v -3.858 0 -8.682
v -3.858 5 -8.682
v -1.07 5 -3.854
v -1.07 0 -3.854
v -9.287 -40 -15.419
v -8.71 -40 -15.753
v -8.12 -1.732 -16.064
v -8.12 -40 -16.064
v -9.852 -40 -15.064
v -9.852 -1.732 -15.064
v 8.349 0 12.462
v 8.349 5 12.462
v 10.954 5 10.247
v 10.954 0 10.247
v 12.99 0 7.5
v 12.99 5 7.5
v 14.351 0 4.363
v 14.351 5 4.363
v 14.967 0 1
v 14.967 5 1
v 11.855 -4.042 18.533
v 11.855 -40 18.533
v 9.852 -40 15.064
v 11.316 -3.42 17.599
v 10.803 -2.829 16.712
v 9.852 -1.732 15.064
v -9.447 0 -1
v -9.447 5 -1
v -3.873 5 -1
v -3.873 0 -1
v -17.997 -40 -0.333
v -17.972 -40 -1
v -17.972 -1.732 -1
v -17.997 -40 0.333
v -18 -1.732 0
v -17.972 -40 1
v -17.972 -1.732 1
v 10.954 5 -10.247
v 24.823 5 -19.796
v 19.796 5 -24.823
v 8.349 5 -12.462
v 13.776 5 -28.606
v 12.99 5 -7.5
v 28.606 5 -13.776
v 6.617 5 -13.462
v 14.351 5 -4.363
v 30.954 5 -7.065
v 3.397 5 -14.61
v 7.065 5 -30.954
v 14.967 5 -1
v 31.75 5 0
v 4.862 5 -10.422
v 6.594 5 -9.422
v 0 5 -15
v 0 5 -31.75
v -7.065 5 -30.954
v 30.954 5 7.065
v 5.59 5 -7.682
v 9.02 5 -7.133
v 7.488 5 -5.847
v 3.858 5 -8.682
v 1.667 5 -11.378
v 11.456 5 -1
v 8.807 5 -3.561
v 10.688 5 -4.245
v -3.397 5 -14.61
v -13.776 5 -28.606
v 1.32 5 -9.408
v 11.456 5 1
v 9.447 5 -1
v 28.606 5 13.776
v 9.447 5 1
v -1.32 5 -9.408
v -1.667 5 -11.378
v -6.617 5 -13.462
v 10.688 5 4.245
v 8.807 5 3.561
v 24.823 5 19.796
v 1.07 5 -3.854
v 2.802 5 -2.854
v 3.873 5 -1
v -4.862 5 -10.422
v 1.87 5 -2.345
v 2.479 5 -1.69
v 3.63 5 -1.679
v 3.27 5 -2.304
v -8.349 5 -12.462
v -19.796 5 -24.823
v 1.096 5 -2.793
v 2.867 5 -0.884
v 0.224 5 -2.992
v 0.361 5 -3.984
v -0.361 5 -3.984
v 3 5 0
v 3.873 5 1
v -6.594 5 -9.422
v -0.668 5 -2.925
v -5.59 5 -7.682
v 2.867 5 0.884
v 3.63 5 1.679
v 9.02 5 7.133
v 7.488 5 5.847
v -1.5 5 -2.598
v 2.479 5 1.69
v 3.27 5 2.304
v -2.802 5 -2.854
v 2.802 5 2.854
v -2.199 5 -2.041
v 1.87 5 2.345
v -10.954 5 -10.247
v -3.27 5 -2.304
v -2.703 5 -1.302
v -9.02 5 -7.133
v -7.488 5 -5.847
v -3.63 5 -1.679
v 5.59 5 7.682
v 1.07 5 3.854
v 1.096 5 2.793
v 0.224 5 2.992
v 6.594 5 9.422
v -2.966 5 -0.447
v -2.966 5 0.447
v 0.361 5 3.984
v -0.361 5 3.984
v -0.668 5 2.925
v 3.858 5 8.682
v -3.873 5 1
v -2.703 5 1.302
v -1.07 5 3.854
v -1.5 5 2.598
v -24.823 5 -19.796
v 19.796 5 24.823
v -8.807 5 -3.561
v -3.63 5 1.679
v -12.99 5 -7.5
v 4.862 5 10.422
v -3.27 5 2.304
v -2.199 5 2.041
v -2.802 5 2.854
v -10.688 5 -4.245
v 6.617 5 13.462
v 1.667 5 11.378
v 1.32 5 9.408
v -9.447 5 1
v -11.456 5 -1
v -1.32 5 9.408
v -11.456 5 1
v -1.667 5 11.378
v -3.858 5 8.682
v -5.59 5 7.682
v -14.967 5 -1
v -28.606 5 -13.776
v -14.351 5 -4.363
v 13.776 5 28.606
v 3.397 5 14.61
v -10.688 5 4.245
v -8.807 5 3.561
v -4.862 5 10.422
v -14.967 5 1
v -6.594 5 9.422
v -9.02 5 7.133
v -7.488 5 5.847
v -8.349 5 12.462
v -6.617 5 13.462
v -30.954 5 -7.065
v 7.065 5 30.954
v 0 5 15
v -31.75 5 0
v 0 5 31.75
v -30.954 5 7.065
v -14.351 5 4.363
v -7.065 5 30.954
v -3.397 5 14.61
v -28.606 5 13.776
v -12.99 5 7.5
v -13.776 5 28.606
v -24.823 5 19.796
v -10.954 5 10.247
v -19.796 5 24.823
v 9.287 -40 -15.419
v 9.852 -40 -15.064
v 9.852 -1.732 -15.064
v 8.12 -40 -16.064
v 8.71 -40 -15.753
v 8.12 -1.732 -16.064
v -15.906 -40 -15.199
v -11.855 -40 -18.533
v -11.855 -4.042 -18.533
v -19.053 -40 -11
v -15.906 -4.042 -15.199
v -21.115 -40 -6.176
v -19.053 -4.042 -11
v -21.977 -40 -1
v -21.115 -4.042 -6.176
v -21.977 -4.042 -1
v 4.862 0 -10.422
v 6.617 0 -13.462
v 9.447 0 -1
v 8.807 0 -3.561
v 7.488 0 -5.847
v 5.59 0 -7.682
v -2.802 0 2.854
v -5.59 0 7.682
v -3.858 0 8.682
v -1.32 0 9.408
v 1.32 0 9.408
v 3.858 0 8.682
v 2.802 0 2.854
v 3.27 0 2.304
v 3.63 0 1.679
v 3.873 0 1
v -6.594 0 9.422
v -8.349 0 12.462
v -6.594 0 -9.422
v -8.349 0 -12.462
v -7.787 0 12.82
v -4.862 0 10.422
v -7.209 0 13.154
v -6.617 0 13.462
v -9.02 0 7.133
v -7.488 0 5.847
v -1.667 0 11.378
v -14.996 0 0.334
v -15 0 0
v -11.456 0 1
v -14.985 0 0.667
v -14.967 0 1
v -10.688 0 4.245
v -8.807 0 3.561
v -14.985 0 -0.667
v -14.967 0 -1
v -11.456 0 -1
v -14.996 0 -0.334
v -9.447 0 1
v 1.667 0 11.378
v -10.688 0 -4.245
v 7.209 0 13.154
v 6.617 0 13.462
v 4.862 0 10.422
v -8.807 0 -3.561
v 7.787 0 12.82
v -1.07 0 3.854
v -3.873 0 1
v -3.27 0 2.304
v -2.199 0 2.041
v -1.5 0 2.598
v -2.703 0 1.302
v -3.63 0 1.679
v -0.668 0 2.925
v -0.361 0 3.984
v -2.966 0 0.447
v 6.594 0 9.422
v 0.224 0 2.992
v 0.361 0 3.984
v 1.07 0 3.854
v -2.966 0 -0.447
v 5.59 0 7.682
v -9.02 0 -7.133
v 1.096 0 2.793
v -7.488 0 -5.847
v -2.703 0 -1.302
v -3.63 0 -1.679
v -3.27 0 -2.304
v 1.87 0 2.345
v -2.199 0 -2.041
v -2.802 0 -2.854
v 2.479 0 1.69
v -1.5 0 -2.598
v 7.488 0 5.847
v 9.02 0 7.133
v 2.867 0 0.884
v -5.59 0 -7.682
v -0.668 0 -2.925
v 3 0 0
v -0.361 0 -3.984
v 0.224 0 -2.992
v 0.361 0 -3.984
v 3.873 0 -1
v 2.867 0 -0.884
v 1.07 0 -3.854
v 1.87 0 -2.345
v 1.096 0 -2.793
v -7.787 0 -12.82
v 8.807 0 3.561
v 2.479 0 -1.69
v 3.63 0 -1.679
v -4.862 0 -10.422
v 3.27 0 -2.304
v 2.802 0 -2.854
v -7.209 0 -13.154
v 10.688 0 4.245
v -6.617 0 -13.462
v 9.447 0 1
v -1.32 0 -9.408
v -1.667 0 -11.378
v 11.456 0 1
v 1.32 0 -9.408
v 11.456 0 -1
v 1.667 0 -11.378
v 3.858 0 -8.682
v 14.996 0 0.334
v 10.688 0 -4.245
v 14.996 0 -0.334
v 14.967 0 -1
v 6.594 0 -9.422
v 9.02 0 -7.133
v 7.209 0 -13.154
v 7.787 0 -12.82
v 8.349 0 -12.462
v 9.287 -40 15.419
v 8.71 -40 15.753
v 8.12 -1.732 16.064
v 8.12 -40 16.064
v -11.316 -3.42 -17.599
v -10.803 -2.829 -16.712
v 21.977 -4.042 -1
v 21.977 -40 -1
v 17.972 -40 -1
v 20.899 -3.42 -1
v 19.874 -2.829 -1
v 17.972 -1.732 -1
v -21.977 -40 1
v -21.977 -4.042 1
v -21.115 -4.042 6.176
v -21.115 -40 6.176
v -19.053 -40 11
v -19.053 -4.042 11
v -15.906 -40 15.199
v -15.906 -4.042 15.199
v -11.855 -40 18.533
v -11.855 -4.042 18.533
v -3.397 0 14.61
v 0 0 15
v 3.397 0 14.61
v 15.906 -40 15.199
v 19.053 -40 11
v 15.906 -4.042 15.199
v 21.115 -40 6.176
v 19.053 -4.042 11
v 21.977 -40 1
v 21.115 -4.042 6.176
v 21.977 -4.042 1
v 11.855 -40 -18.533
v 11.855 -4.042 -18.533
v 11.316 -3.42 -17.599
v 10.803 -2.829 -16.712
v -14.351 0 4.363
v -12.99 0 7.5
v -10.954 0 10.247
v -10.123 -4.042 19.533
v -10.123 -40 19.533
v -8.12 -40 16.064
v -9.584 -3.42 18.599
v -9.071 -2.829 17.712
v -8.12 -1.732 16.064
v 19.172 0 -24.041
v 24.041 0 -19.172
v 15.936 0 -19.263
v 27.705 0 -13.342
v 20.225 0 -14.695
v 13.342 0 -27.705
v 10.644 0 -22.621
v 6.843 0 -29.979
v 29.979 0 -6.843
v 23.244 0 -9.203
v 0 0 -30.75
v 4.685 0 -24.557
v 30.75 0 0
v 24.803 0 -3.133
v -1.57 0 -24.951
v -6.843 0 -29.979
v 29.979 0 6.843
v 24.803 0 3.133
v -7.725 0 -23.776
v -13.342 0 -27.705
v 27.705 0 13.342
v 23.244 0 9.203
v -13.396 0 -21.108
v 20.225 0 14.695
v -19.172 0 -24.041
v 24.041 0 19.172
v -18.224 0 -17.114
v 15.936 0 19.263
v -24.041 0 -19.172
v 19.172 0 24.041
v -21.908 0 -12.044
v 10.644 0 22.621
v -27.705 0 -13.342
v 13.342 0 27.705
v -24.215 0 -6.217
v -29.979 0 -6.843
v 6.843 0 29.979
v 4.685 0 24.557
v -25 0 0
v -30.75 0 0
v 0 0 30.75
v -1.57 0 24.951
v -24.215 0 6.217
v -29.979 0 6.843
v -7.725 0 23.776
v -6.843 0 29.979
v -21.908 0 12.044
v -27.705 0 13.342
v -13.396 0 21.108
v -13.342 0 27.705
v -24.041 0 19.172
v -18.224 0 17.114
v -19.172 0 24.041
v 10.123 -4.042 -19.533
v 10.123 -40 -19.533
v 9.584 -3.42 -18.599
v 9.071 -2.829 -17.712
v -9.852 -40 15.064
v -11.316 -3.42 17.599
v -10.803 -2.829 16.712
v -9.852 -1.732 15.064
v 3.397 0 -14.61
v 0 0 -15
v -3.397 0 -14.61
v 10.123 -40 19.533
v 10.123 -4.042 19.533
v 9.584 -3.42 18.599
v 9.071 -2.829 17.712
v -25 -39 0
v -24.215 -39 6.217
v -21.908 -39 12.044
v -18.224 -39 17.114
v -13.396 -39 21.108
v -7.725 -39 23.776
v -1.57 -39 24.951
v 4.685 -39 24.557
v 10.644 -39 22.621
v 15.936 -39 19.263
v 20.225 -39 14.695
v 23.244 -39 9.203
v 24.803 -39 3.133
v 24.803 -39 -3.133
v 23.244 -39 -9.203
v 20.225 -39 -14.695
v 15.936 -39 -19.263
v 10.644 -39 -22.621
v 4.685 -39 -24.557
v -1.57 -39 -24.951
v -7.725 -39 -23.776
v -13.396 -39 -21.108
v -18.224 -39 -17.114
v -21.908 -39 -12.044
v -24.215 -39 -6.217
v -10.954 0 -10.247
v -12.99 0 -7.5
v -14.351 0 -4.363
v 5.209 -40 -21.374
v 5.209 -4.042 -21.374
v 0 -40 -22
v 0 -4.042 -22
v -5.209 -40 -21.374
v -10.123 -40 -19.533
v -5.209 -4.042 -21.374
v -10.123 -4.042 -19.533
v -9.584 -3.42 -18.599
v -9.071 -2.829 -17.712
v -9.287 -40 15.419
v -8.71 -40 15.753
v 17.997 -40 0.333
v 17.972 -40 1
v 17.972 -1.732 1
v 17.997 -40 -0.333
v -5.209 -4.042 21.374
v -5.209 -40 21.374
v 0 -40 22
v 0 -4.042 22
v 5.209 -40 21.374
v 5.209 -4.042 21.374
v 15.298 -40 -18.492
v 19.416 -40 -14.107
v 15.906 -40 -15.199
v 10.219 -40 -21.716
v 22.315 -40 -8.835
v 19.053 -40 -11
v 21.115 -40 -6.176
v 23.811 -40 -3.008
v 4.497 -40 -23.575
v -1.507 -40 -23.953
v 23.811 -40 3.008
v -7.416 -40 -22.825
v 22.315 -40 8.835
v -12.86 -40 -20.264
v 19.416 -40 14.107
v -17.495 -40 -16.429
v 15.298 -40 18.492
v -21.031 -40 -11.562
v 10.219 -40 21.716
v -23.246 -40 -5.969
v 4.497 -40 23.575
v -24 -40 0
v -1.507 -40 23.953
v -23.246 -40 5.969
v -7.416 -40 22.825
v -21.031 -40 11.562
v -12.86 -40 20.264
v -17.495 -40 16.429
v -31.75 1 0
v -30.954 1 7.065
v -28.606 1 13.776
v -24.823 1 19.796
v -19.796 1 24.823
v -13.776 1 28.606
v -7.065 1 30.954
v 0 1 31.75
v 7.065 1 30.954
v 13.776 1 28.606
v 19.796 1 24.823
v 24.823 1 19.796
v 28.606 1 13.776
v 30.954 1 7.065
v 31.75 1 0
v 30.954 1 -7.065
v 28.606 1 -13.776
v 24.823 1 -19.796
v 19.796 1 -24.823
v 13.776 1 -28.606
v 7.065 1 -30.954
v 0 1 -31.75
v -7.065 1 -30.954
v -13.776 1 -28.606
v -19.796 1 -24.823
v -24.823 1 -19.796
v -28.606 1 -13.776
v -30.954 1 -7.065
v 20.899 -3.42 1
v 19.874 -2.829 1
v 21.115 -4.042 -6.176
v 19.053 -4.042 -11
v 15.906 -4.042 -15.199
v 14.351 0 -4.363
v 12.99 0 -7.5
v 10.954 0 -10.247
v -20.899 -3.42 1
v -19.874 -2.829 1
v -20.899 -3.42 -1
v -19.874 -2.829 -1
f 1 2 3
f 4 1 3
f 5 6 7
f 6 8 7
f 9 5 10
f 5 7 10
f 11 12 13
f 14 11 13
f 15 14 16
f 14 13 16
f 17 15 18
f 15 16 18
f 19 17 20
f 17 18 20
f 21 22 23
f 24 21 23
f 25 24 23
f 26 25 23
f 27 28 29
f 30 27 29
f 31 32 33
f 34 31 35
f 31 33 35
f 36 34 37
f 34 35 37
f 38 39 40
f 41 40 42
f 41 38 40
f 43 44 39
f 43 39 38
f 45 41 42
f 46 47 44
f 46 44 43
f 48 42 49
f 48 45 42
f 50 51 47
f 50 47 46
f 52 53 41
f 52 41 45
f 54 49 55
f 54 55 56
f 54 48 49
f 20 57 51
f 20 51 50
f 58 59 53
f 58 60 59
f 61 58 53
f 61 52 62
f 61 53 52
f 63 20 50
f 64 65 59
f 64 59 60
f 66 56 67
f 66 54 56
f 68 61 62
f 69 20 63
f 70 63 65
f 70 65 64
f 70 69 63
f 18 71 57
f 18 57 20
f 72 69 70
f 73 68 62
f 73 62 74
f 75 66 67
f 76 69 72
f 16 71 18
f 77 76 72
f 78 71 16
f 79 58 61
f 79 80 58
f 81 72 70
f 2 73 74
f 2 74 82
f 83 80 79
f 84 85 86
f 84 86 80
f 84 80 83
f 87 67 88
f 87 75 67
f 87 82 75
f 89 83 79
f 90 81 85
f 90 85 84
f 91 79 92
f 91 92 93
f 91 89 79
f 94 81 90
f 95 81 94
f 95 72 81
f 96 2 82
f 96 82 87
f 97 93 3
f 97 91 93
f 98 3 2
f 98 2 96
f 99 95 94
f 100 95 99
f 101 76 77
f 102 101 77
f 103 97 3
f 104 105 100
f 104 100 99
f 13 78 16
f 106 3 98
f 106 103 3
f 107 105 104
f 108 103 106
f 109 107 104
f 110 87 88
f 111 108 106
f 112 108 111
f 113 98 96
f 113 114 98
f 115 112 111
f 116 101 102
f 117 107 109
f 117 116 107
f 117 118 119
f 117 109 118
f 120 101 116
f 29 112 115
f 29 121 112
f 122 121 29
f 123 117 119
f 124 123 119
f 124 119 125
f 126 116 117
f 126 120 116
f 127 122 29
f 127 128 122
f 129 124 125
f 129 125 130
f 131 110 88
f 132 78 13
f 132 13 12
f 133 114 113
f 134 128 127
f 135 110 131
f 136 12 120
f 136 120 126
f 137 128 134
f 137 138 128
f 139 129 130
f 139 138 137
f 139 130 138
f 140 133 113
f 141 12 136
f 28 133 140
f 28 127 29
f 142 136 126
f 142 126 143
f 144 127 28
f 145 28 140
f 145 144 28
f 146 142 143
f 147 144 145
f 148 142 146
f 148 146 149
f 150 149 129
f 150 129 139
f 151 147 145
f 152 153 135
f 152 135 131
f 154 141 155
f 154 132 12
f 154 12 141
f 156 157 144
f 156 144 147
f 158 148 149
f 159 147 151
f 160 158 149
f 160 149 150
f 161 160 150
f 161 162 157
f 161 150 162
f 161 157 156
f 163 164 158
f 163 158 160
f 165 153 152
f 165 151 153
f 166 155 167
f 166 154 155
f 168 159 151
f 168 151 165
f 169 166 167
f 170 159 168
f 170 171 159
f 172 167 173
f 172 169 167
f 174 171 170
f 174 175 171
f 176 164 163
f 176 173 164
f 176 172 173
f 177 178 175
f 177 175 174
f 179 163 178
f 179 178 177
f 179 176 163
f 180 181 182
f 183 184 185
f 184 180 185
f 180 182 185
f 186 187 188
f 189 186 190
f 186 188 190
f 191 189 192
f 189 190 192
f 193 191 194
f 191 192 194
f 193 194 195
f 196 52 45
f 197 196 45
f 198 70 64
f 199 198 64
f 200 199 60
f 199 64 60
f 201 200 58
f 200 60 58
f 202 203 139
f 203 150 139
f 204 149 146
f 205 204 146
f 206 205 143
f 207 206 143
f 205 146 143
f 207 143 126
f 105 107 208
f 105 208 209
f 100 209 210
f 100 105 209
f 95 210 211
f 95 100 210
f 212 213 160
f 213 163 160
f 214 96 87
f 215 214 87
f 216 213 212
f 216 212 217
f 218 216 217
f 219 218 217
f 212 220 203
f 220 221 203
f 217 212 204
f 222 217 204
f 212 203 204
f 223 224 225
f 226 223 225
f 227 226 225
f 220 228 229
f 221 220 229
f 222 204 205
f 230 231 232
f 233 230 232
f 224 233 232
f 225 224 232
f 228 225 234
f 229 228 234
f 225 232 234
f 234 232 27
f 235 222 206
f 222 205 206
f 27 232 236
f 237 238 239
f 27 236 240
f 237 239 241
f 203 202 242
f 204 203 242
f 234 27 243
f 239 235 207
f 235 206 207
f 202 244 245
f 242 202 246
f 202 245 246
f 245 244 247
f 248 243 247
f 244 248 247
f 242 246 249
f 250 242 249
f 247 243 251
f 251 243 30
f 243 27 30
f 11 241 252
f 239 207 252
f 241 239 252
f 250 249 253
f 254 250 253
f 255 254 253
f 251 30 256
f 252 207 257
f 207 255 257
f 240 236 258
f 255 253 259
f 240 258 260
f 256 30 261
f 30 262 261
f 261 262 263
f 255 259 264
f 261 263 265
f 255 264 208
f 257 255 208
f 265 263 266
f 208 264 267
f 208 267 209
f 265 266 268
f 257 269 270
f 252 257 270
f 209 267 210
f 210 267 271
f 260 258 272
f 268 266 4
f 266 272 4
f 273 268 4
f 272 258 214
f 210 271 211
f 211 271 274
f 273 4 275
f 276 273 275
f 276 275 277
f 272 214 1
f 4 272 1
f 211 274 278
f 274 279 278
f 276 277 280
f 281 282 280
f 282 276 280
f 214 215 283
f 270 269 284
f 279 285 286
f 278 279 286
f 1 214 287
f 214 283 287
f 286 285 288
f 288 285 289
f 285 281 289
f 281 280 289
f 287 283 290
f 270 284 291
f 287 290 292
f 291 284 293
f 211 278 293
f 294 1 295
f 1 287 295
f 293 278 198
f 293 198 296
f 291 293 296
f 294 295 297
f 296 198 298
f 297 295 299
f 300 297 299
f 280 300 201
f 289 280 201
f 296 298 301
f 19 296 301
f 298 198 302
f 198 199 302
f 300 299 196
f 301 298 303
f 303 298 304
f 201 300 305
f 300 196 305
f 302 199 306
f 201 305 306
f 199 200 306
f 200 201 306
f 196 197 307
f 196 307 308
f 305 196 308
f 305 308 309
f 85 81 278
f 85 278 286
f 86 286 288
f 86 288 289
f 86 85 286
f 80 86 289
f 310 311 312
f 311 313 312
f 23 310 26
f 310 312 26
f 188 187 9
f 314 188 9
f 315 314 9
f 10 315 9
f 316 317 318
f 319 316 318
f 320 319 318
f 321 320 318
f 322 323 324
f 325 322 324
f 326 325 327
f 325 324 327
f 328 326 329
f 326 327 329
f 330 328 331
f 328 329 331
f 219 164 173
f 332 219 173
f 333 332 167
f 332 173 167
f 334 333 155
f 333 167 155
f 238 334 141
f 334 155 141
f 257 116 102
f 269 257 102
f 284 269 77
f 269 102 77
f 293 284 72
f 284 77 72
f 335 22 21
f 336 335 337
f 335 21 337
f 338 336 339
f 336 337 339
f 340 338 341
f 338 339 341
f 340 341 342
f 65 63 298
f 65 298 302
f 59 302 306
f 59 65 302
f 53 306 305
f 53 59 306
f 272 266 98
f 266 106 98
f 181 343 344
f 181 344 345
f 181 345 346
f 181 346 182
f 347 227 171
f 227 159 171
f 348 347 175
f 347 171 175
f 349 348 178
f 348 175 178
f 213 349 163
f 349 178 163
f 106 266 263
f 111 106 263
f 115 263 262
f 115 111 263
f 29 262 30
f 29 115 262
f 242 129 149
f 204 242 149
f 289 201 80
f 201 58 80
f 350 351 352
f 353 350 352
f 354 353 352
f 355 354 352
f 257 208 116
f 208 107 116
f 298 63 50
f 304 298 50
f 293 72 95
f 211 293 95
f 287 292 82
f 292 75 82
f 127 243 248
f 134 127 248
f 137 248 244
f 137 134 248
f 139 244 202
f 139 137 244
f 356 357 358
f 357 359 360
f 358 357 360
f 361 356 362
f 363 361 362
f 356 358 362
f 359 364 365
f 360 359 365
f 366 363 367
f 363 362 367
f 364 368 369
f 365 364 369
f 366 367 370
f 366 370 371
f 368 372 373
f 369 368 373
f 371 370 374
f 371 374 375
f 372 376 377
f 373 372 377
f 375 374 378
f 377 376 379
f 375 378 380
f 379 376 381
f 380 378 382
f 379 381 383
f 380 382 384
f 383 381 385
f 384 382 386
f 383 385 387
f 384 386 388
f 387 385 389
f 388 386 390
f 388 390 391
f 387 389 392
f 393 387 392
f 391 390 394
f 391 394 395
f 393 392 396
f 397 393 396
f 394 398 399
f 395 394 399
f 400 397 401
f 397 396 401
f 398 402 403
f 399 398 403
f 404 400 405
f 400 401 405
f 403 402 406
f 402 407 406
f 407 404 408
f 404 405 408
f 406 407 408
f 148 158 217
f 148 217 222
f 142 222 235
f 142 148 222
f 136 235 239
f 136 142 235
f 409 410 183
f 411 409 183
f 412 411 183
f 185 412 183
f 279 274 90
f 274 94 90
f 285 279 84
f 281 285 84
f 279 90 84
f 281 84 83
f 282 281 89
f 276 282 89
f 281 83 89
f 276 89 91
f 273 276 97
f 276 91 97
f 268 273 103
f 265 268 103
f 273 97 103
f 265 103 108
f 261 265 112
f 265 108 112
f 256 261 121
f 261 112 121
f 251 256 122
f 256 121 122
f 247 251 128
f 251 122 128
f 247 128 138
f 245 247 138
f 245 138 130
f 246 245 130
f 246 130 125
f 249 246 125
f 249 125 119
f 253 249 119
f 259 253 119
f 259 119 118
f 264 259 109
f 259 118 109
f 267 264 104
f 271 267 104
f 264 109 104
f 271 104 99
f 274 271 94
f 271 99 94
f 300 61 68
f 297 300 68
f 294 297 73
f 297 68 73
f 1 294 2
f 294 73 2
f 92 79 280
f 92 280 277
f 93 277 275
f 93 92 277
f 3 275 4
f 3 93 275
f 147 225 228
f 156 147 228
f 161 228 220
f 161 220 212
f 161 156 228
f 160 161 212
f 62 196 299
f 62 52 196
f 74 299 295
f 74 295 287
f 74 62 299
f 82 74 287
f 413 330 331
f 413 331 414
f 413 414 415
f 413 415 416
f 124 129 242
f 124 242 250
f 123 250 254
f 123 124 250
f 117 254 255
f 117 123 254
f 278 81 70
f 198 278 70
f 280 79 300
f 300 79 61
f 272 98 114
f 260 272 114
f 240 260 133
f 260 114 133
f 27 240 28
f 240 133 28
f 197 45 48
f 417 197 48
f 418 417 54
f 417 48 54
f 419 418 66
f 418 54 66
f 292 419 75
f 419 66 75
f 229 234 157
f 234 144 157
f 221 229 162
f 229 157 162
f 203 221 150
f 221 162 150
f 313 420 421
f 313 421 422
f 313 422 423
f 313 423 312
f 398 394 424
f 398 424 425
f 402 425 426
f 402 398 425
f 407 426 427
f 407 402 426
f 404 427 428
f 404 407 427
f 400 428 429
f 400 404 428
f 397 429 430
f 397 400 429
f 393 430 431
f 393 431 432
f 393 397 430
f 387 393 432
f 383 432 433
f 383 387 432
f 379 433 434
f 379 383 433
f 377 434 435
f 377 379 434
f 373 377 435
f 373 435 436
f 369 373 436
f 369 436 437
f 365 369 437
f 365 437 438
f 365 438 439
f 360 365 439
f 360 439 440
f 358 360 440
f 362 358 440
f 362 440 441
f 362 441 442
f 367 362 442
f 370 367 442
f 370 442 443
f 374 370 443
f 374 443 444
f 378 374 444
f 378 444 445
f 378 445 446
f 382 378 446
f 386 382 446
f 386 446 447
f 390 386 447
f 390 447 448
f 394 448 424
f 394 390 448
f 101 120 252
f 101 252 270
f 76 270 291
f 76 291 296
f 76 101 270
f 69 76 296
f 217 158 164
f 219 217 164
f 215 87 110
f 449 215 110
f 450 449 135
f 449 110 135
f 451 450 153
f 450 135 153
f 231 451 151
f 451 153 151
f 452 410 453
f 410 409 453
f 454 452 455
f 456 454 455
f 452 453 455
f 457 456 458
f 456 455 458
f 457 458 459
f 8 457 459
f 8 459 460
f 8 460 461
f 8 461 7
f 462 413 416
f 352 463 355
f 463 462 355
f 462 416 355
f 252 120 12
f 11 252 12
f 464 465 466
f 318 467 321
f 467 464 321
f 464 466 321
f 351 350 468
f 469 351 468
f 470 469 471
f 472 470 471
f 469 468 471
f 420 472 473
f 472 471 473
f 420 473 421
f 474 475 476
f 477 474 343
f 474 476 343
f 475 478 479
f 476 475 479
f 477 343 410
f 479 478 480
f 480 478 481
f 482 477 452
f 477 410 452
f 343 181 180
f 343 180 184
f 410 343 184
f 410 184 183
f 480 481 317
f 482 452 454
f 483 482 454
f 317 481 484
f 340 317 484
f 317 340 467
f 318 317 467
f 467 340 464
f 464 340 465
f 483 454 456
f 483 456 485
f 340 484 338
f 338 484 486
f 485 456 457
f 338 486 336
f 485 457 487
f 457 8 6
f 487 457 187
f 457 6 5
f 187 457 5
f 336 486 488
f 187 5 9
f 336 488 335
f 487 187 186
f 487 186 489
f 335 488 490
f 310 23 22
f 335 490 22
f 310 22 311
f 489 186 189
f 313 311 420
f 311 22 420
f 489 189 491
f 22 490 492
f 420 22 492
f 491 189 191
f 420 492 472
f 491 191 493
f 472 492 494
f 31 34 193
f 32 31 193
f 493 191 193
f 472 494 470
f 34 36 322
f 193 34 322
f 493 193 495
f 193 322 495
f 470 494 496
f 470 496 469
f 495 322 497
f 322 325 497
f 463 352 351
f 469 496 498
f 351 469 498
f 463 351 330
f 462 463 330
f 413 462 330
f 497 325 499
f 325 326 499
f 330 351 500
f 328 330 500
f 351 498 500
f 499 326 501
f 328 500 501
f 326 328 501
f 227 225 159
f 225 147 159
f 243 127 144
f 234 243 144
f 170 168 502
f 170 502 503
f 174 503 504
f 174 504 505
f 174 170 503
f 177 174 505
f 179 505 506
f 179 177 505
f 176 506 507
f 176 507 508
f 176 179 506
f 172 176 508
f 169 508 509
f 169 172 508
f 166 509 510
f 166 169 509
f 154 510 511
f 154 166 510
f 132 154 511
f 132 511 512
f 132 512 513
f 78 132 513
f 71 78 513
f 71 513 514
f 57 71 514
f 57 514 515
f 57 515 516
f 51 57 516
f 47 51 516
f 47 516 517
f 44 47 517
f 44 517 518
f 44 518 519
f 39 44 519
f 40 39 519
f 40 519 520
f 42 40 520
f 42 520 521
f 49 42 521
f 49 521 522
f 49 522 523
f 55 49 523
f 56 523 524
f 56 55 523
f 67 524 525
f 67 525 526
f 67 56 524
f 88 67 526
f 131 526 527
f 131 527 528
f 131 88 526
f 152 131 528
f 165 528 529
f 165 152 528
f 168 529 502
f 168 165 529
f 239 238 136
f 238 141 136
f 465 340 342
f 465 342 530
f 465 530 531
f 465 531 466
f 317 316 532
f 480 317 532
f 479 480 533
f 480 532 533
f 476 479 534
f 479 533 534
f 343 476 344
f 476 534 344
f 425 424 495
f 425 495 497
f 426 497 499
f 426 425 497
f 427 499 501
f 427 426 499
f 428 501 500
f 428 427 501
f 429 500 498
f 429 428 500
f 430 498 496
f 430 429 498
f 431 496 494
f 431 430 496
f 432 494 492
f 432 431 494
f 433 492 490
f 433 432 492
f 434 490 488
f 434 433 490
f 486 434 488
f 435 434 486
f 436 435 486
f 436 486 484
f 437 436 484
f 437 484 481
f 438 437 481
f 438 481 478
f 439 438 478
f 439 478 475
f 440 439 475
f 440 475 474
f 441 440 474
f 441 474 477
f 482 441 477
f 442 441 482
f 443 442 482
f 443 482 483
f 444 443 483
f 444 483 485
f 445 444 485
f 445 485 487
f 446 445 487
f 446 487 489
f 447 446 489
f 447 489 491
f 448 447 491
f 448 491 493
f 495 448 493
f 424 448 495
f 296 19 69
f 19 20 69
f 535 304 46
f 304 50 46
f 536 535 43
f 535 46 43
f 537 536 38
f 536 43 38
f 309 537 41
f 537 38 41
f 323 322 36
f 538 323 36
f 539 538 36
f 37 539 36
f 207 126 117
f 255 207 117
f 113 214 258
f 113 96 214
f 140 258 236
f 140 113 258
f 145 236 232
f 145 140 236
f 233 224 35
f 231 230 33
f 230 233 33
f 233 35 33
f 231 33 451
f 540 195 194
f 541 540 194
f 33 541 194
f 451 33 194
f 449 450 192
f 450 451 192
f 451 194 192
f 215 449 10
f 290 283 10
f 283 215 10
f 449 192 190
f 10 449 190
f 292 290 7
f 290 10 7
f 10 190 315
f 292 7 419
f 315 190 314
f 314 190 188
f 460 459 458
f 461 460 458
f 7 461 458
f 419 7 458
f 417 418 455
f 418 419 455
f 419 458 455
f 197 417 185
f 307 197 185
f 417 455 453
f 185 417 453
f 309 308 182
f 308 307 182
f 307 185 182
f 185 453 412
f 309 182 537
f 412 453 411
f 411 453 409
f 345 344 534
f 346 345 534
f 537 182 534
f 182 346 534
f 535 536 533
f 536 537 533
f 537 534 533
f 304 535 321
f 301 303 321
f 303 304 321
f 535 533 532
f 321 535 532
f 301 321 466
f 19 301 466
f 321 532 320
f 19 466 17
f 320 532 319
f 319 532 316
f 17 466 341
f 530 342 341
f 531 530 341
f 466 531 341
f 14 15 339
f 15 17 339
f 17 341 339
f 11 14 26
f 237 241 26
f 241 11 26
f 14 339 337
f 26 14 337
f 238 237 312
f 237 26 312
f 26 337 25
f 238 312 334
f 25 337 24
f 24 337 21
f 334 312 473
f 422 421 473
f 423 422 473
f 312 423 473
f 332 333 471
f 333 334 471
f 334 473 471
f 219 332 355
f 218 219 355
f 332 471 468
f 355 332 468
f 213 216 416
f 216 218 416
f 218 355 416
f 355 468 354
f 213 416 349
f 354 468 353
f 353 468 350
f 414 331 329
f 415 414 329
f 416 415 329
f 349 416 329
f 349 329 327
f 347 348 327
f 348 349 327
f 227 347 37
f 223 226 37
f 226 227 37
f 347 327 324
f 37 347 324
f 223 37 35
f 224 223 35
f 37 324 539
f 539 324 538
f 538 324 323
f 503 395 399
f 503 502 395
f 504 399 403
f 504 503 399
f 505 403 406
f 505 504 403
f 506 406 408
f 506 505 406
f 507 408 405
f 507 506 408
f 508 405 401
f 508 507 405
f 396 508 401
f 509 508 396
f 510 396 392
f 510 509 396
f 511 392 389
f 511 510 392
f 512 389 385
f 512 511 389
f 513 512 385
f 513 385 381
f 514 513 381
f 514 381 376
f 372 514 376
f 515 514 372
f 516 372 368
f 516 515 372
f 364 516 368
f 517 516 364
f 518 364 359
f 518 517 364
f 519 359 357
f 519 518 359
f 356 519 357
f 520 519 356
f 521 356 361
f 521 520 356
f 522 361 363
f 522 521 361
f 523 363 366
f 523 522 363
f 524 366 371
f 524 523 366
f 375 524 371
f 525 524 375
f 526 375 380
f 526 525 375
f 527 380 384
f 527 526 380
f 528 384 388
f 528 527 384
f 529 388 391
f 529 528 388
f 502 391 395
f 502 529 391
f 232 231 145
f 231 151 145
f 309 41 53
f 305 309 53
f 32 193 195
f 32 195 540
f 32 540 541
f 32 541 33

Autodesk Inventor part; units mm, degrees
ref_plane "YZ Plane" through (0, 0, 0) normal (1, 0, 0) x (0, 1, 0)
ref_plane "XZ Plane" through (0, 0, 0) normal (0, 1, 0) x (-1, 0, 0)
ref_plane "XY Plane" through (0, 0, 0) normal (0, 0, 1) x (1, 0, 0)
sketch "Skizze1" plane through (0, 0, 0) normal (0, 0, 1) x (1, 0, 0)
  line L0 (-25, -40) -> (-25, 0)
  line L1 (-25, 0) -> (-31.75, 0)
  line L2 (-31.75, 0) -> (-31.75, 5)
  line L3 (-31.75, 5) -> (-15, 5)
  line L4 (-22, -40) -> (-22, -4.0415)
  line L5 (-22, -4.0415) -> (-15, 0)
  line L6 (-15, 0) -> (-15, 5)
  line L7 (-38.1, 0) -> (6.35, 0) construction
  line L8 (-22, -40) -> (-25, -40)
  line L9 (0, -49) -> (0, 14) projected
  point P0 (0, 0)
  dimension "d2" = 60
  dimension "d3" = 3
  dimension "d4" = 5
  dimension "d5" = 7
  dimension "d6" = 50
  dimension "d7" = 40
  dimension "d8" = 63.5
  dimension "d38" = 5
  dimension "d47" = 30
revolve "Umdrehung1" add sketch "Skizze1" angle 360 about axis through (0, -10, 0) along (0, 1, 0)
sketch "Skizze2" plane through (0, 5, 0) normal (0, 1, 0) x (1, 0, 0)
  circle A0 centre (0, 0) radius 15 projected
  circle A1 centre (0, 0) radius 31.75 projected
  line L0 (-44.45, 0) -> (44.45, 0) construction
  line L1 (0, 44.45) -> (0, -44.45) construction
  circle A2 centre (0, 0) radius 9.5
  circle A3 centre (0, 0) radius 11.5
  circle A4 centre (0, 0) radius 4
  circle A5 centre (0, 0) radius 3
  line L2 (-14.9666, 1) -> (-3.873, 1)
  line L3 (-3.873, -1) -> (-14.9666, -1)
  arc A6 (-3.873, 1) -> (-3.873, -1) centre (0, 0) ccw
  arc A7 (-14.9666, 1) -> (-14.9666, -1) centre (0, 0) ccw
  line L4 (-8.3493, -12.4615) -> (-2.8025, -2.8541)
  line L5 (-1.0705, -3.8541) -> (-6.6173, -13.4615)
  arc A8 (-8.3493, -12.4615) -> (-6.6173, -13.4615) centre (0, 0) ccw
  arc A9 (-2.8025, -2.8541) -> (-1.0705, -3.8541) centre (0, 0) ccw
  line L6 (6.6173, -13.4615) -> (1.0705, -3.8541)
  line L7 (2.8025, -2.8541) -> (8.3493, -12.4615)
  arc A10 (6.6173, -13.4615) -> (8.3493, -12.4615) centre (0, 0) ccw
  arc A11 (1.0705, -3.8541) -> (2.8025, -2.8541) centre (0, 0) ccw
  line L8 (14.9666, -1) -> (3.873, -1)
  line L9 (3.873, 1) -> (14.9666, 1)
  arc A12 (14.9666, -1) -> (14.9666, 1) centre (0, 0) ccw
  arc A13 (3.873, -1) -> (3.873, 1) centre (0, 0) ccw
  line L10 (8.3493, 12.4615) -> (2.8025, 2.8541)
  line L11 (1.0705, 3.8541) -> (6.6173, 13.4615)
  arc A14 (8.3493, 12.4615) -> (6.6173, 13.4615) centre (0, 0) ccw
  arc A15 (2.8025, 2.8541) -> (1.0705, 3.8541) centre (0, 0) ccw
  line L12 (-6.6173, 13.4615) -> (-1.0705, 3.8541)
  line L13 (-2.8025, 2.8541) -> (-8.3493, 12.4615)
  arc A16 (-6.6173, 13.4615) -> (-8.3493, 12.4615) centre (0, 0) ccw
  arc A17 (-1.0705, 3.8541) -> (-2.8025, 2.8541) centre (0, 0) ccw
  dimension "d25" = 19
  dimension "d26" = 23
  dimension "d28" = 8
  dimension "d29" = 6
  dimension "d30" = 2
  dimension "d41" = 360
extrude "Extrusion1" add sketch "Skizze2" against normal blind 5 contours A0 L8 A3 L9 | L10 A3 L11 A0 | L9 A2 L10 A3 | A3 L8 A2 L9 | A0 L6 A3 L7 | A3 L7 A2 L8 | L10 A2 L11 A3 | A2 L8 A4 L9 | A3 L6 A2 L7 | L12 A3 L13 A0 | L11 A2 L12 A3 | L10 A4 L11 A2 | A4 | A0 L4 A3 L5 | A3 L5 A2 L6 | A2 L6 A4 L7 | L12 A2 L13 A3 | A3 L4 A2 L5 | L2 A3 L3 A0 | L13 A2 L2 A3 | L12 A4 L13 A2 | A3 L3 A2 L4 | A2 L4 A4 L5 | L2 A2 L3 A3 | L2 A4 L3 A2
chamfer "Fase1" distance 1 angle 45 2 edges at (31.75, 0, 0) (25, -40, 0)
sketch "Skizze3" plane through (0, 0, 0) normal (0, -1, 0) x (1, 0, 0)
  circle A0 centre (0, 0) radius 22 projected
  arc A1 (-6.6173, -13.4615) -> (6.6173, -13.4615) centre (0, 0) ccw projected
  line L0 (6.6173, -13.4615) -> (4.8622, -10.4216) projected
  arc A2 (-4.8622, -10.4216) -> (4.8622, -10.4216) centre (0, 0) ccw projected
  line L1 (-4.8622, -10.4216) -> (-6.6173, -13.4615) projected
  line L2 (-8.3493, -12.4615) -> (-6.5942, -9.4216) projected
  arc A3 (-11.4564, -1) -> (-6.5942, -9.4216) centre (0, 0) ccw projected
  line L3 (-11.4564, -1) -> (-14.9666, -1) projected
  arc A4 (-14.9666, -1) -> (-8.3493, -12.4615) centre (0, 0) ccw projected
  line L4 (-14.9666, 1) -> (-11.4564, 1) projected
  arc A5 (-6.5942, 9.4216) -> (-11.4564, 1) centre (0, 0) ccw projected
  line L5 (-6.5942, 9.4216) -> (-8.3493, 12.4615) projected
  arc A6 (-8.3493, 12.4615) -> (-14.9666, 1) centre (0, 0) ccw projected
  line L6 (-6.6173, 13.4615) -> (-4.8622, 10.4216) projected
  arc A7 (4.8622, 10.4216) -> (-4.8622, 10.4216) centre (0, 0) ccw projected
  line L7 (4.8622, 10.4216) -> (6.6173, 13.4615) projected
  arc A8 (6.6173, 13.4615) -> (-6.6173, 13.4615) centre (0, 0) ccw projected
  line L8 (8.3493, 12.4615) -> (6.5942, 9.4216) projected
  arc A9 (11.4564, 1) -> (6.5942, 9.4216) centre (0, 0) ccw projected
  line L9 (11.4564, 1) -> (14.9666, 1) projected
  arc A10 (14.9666, 1) -> (8.3493, 12.4615) centre (0, 0) ccw projected
  arc A11 (3.8576, 8.6815) -> (-3.8576, 8.6815) centre (0, 0) ccw projected
  line L10 (-3.8576, 8.6815) -> (-1.0705, 3.8541) projected
  arc A12 (1.0705, 3.8541) -> (-1.0705, 3.8541) centre (0, 0) ccw projected
  line L11 (1.0705, 3.8541) -> (3.8576, 8.6815) projected
  line L12 (9.4472, -1) -> (3.873, -1) projected
  arc A13 (2.8025, -2.8541) -> (3.873, -1) centre (0, 0) ccw projected
  line L13 (2.8025, -2.8541) -> (5.5896, -7.6815) projected
  arc A14 (5.5896, -7.6815) -> (9.4472, -1) centre (0, 0) ccw projected
  circle A15 centre (0, 0) radius 3 projected
  line L14 (3.8576, -8.6815) -> (1.0705, -3.8541) projected
  arc A16 (-1.0705, -3.8541) -> (1.0705, -3.8541) centre (0, 0) ccw projected
  line L15 (-1.0705, -3.8541) -> (-3.8576, -8.6815) projected
  arc A17 (-3.8576, -8.6815) -> (3.8576, -8.6815) centre (0, 0) ccw projected
  line L16 (5.5896, 7.6815) -> (2.8025, 2.8541) projected
  arc A18 (3.873, 1) -> (2.8025, 2.8541) centre (0, 0) ccw projected
  line L17 (3.873, 1) -> (9.4472, 1) projected
  arc A19 (9.4472, 1) -> (5.5896, 7.6815) centre (0, 0) ccw projected
  arc A20 (-5.5896, 7.6815) -> (-9.4472, 1) centre (0, 0) ccw projected
  line L18 (-9.4472, 1) -> (-3.873, 1) projected
  arc A21 (-2.8025, 2.8541) -> (-3.873, 1) centre (0, 0) ccw projected
  line L19 (-2.8025, 2.8541) -> (-5.5896, 7.6815) projected
  arc A22 (-9.4472, -1) -> (-5.5896, -7.6815) centre (0, 0) ccw projected
  line L20 (-5.5896, -7.6815) -> (-2.8025, -2.8541) projected
  arc A23 (-3.873, -1) -> (-2.8025, -2.8541) centre (0, 0) ccw projected
  line L21 (-3.873, -1) -> (-9.4472, -1) projected
  line L22 (14.9666, -1) -> (11.4564, -1) projected
  arc A24 (6.5942, -9.4216) -> (11.4564, -1) centre (0, 0) ccw projected
  line L23 (6.5942, -9.4216) -> (8.3493, -12.4615) projected
  arc A25 (8.3493, -12.4615) -> (14.9666, -1) centre (0, 0) ccw projected
  circle A26 centre (0, 0) radius 31.75 projected
  line L24 (21.9773, -1) -> (17.9722, -1)
  line L25 (21.9773, 1) -> (17.9722, 1)
  arc A27 (17.9722, -1) -> (17.9722, 1) centre (0, 0) ccw
  arc A28 (21.9773, -1) -> (21.9773, 1) centre (0, 0) ccw
  arc A29 (9.8521, 15.0644) -> (8.1201, 16.0644) centre (0, 0) ccw
  line L26 (11.8547, 18.5329) -> (9.8521, 15.0644)
  arc A30 (11.8547, 18.5329) -> (10.1226, 19.5329) centre (0, 0) ccw
  line L27 (10.1226, 19.5329) -> (8.1201, 16.0644)
  arc A31 (-8.1201, 16.0644) -> (-9.8521, 15.0644) centre (0, 0) ccw
  line L28 (-10.1226, 19.5329) -> (-8.1201, 16.0644)
  arc A32 (-10.1226, 19.5329) -> (-11.8547, 18.5329) centre (0, 0) ccw
  line L29 (-11.8547, 18.5329) -> (-9.8521, 15.0644)
  arc A33 (-17.9722, 1) -> (-17.9722, -1) centre (0, 0) ccw
  line L30 (-21.9773, 1) -> (-17.9722, 1)
  arc A34 (-21.9773, 1) -> (-21.9773, -1) centre (0, 0) ccw
  line L31 (-21.9773, -1) -> (-17.9722, -1)
  arc A35 (-9.8521, -15.0644) -> (-8.1201, -16.0644) centre (0, 0) ccw
  line L32 (-11.8547, -18.5329) -> (-9.8521, -15.0644)
  arc A36 (-11.8547, -18.5329) -> (-10.1226, -19.5329) centre (0, 0) ccw
  line L33 (-10.1226, -19.5329) -> (-8.1201, -16.0644)
  arc A37 (8.1201, -16.0644) -> (9.8521, -15.0644) centre (0, 0) ccw
  line L34 (10.1226, -19.5329) -> (8.1201, -16.0644)
  arc A38 (10.1226, -19.5329) -> (11.8547, -18.5329) centre (0, 0) ccw
  line L35 (11.8547, -18.5329) -> (9.8521, -15.0644)
  dimension "d51" = 18
  dimension "d56" = 360
extrude "Extrusion5" add sketch "Skizze3" along normal up to surface (40 mm away) contours A0 L24 A27 L25 | L26 A29 L27 A0 | A0 L34 A37 L35 | L28 A31 L29 A0 | A0 L32 A35 L33 | L30 A33 L31 A0
properties part number "Unterdruckventil_Basis"
